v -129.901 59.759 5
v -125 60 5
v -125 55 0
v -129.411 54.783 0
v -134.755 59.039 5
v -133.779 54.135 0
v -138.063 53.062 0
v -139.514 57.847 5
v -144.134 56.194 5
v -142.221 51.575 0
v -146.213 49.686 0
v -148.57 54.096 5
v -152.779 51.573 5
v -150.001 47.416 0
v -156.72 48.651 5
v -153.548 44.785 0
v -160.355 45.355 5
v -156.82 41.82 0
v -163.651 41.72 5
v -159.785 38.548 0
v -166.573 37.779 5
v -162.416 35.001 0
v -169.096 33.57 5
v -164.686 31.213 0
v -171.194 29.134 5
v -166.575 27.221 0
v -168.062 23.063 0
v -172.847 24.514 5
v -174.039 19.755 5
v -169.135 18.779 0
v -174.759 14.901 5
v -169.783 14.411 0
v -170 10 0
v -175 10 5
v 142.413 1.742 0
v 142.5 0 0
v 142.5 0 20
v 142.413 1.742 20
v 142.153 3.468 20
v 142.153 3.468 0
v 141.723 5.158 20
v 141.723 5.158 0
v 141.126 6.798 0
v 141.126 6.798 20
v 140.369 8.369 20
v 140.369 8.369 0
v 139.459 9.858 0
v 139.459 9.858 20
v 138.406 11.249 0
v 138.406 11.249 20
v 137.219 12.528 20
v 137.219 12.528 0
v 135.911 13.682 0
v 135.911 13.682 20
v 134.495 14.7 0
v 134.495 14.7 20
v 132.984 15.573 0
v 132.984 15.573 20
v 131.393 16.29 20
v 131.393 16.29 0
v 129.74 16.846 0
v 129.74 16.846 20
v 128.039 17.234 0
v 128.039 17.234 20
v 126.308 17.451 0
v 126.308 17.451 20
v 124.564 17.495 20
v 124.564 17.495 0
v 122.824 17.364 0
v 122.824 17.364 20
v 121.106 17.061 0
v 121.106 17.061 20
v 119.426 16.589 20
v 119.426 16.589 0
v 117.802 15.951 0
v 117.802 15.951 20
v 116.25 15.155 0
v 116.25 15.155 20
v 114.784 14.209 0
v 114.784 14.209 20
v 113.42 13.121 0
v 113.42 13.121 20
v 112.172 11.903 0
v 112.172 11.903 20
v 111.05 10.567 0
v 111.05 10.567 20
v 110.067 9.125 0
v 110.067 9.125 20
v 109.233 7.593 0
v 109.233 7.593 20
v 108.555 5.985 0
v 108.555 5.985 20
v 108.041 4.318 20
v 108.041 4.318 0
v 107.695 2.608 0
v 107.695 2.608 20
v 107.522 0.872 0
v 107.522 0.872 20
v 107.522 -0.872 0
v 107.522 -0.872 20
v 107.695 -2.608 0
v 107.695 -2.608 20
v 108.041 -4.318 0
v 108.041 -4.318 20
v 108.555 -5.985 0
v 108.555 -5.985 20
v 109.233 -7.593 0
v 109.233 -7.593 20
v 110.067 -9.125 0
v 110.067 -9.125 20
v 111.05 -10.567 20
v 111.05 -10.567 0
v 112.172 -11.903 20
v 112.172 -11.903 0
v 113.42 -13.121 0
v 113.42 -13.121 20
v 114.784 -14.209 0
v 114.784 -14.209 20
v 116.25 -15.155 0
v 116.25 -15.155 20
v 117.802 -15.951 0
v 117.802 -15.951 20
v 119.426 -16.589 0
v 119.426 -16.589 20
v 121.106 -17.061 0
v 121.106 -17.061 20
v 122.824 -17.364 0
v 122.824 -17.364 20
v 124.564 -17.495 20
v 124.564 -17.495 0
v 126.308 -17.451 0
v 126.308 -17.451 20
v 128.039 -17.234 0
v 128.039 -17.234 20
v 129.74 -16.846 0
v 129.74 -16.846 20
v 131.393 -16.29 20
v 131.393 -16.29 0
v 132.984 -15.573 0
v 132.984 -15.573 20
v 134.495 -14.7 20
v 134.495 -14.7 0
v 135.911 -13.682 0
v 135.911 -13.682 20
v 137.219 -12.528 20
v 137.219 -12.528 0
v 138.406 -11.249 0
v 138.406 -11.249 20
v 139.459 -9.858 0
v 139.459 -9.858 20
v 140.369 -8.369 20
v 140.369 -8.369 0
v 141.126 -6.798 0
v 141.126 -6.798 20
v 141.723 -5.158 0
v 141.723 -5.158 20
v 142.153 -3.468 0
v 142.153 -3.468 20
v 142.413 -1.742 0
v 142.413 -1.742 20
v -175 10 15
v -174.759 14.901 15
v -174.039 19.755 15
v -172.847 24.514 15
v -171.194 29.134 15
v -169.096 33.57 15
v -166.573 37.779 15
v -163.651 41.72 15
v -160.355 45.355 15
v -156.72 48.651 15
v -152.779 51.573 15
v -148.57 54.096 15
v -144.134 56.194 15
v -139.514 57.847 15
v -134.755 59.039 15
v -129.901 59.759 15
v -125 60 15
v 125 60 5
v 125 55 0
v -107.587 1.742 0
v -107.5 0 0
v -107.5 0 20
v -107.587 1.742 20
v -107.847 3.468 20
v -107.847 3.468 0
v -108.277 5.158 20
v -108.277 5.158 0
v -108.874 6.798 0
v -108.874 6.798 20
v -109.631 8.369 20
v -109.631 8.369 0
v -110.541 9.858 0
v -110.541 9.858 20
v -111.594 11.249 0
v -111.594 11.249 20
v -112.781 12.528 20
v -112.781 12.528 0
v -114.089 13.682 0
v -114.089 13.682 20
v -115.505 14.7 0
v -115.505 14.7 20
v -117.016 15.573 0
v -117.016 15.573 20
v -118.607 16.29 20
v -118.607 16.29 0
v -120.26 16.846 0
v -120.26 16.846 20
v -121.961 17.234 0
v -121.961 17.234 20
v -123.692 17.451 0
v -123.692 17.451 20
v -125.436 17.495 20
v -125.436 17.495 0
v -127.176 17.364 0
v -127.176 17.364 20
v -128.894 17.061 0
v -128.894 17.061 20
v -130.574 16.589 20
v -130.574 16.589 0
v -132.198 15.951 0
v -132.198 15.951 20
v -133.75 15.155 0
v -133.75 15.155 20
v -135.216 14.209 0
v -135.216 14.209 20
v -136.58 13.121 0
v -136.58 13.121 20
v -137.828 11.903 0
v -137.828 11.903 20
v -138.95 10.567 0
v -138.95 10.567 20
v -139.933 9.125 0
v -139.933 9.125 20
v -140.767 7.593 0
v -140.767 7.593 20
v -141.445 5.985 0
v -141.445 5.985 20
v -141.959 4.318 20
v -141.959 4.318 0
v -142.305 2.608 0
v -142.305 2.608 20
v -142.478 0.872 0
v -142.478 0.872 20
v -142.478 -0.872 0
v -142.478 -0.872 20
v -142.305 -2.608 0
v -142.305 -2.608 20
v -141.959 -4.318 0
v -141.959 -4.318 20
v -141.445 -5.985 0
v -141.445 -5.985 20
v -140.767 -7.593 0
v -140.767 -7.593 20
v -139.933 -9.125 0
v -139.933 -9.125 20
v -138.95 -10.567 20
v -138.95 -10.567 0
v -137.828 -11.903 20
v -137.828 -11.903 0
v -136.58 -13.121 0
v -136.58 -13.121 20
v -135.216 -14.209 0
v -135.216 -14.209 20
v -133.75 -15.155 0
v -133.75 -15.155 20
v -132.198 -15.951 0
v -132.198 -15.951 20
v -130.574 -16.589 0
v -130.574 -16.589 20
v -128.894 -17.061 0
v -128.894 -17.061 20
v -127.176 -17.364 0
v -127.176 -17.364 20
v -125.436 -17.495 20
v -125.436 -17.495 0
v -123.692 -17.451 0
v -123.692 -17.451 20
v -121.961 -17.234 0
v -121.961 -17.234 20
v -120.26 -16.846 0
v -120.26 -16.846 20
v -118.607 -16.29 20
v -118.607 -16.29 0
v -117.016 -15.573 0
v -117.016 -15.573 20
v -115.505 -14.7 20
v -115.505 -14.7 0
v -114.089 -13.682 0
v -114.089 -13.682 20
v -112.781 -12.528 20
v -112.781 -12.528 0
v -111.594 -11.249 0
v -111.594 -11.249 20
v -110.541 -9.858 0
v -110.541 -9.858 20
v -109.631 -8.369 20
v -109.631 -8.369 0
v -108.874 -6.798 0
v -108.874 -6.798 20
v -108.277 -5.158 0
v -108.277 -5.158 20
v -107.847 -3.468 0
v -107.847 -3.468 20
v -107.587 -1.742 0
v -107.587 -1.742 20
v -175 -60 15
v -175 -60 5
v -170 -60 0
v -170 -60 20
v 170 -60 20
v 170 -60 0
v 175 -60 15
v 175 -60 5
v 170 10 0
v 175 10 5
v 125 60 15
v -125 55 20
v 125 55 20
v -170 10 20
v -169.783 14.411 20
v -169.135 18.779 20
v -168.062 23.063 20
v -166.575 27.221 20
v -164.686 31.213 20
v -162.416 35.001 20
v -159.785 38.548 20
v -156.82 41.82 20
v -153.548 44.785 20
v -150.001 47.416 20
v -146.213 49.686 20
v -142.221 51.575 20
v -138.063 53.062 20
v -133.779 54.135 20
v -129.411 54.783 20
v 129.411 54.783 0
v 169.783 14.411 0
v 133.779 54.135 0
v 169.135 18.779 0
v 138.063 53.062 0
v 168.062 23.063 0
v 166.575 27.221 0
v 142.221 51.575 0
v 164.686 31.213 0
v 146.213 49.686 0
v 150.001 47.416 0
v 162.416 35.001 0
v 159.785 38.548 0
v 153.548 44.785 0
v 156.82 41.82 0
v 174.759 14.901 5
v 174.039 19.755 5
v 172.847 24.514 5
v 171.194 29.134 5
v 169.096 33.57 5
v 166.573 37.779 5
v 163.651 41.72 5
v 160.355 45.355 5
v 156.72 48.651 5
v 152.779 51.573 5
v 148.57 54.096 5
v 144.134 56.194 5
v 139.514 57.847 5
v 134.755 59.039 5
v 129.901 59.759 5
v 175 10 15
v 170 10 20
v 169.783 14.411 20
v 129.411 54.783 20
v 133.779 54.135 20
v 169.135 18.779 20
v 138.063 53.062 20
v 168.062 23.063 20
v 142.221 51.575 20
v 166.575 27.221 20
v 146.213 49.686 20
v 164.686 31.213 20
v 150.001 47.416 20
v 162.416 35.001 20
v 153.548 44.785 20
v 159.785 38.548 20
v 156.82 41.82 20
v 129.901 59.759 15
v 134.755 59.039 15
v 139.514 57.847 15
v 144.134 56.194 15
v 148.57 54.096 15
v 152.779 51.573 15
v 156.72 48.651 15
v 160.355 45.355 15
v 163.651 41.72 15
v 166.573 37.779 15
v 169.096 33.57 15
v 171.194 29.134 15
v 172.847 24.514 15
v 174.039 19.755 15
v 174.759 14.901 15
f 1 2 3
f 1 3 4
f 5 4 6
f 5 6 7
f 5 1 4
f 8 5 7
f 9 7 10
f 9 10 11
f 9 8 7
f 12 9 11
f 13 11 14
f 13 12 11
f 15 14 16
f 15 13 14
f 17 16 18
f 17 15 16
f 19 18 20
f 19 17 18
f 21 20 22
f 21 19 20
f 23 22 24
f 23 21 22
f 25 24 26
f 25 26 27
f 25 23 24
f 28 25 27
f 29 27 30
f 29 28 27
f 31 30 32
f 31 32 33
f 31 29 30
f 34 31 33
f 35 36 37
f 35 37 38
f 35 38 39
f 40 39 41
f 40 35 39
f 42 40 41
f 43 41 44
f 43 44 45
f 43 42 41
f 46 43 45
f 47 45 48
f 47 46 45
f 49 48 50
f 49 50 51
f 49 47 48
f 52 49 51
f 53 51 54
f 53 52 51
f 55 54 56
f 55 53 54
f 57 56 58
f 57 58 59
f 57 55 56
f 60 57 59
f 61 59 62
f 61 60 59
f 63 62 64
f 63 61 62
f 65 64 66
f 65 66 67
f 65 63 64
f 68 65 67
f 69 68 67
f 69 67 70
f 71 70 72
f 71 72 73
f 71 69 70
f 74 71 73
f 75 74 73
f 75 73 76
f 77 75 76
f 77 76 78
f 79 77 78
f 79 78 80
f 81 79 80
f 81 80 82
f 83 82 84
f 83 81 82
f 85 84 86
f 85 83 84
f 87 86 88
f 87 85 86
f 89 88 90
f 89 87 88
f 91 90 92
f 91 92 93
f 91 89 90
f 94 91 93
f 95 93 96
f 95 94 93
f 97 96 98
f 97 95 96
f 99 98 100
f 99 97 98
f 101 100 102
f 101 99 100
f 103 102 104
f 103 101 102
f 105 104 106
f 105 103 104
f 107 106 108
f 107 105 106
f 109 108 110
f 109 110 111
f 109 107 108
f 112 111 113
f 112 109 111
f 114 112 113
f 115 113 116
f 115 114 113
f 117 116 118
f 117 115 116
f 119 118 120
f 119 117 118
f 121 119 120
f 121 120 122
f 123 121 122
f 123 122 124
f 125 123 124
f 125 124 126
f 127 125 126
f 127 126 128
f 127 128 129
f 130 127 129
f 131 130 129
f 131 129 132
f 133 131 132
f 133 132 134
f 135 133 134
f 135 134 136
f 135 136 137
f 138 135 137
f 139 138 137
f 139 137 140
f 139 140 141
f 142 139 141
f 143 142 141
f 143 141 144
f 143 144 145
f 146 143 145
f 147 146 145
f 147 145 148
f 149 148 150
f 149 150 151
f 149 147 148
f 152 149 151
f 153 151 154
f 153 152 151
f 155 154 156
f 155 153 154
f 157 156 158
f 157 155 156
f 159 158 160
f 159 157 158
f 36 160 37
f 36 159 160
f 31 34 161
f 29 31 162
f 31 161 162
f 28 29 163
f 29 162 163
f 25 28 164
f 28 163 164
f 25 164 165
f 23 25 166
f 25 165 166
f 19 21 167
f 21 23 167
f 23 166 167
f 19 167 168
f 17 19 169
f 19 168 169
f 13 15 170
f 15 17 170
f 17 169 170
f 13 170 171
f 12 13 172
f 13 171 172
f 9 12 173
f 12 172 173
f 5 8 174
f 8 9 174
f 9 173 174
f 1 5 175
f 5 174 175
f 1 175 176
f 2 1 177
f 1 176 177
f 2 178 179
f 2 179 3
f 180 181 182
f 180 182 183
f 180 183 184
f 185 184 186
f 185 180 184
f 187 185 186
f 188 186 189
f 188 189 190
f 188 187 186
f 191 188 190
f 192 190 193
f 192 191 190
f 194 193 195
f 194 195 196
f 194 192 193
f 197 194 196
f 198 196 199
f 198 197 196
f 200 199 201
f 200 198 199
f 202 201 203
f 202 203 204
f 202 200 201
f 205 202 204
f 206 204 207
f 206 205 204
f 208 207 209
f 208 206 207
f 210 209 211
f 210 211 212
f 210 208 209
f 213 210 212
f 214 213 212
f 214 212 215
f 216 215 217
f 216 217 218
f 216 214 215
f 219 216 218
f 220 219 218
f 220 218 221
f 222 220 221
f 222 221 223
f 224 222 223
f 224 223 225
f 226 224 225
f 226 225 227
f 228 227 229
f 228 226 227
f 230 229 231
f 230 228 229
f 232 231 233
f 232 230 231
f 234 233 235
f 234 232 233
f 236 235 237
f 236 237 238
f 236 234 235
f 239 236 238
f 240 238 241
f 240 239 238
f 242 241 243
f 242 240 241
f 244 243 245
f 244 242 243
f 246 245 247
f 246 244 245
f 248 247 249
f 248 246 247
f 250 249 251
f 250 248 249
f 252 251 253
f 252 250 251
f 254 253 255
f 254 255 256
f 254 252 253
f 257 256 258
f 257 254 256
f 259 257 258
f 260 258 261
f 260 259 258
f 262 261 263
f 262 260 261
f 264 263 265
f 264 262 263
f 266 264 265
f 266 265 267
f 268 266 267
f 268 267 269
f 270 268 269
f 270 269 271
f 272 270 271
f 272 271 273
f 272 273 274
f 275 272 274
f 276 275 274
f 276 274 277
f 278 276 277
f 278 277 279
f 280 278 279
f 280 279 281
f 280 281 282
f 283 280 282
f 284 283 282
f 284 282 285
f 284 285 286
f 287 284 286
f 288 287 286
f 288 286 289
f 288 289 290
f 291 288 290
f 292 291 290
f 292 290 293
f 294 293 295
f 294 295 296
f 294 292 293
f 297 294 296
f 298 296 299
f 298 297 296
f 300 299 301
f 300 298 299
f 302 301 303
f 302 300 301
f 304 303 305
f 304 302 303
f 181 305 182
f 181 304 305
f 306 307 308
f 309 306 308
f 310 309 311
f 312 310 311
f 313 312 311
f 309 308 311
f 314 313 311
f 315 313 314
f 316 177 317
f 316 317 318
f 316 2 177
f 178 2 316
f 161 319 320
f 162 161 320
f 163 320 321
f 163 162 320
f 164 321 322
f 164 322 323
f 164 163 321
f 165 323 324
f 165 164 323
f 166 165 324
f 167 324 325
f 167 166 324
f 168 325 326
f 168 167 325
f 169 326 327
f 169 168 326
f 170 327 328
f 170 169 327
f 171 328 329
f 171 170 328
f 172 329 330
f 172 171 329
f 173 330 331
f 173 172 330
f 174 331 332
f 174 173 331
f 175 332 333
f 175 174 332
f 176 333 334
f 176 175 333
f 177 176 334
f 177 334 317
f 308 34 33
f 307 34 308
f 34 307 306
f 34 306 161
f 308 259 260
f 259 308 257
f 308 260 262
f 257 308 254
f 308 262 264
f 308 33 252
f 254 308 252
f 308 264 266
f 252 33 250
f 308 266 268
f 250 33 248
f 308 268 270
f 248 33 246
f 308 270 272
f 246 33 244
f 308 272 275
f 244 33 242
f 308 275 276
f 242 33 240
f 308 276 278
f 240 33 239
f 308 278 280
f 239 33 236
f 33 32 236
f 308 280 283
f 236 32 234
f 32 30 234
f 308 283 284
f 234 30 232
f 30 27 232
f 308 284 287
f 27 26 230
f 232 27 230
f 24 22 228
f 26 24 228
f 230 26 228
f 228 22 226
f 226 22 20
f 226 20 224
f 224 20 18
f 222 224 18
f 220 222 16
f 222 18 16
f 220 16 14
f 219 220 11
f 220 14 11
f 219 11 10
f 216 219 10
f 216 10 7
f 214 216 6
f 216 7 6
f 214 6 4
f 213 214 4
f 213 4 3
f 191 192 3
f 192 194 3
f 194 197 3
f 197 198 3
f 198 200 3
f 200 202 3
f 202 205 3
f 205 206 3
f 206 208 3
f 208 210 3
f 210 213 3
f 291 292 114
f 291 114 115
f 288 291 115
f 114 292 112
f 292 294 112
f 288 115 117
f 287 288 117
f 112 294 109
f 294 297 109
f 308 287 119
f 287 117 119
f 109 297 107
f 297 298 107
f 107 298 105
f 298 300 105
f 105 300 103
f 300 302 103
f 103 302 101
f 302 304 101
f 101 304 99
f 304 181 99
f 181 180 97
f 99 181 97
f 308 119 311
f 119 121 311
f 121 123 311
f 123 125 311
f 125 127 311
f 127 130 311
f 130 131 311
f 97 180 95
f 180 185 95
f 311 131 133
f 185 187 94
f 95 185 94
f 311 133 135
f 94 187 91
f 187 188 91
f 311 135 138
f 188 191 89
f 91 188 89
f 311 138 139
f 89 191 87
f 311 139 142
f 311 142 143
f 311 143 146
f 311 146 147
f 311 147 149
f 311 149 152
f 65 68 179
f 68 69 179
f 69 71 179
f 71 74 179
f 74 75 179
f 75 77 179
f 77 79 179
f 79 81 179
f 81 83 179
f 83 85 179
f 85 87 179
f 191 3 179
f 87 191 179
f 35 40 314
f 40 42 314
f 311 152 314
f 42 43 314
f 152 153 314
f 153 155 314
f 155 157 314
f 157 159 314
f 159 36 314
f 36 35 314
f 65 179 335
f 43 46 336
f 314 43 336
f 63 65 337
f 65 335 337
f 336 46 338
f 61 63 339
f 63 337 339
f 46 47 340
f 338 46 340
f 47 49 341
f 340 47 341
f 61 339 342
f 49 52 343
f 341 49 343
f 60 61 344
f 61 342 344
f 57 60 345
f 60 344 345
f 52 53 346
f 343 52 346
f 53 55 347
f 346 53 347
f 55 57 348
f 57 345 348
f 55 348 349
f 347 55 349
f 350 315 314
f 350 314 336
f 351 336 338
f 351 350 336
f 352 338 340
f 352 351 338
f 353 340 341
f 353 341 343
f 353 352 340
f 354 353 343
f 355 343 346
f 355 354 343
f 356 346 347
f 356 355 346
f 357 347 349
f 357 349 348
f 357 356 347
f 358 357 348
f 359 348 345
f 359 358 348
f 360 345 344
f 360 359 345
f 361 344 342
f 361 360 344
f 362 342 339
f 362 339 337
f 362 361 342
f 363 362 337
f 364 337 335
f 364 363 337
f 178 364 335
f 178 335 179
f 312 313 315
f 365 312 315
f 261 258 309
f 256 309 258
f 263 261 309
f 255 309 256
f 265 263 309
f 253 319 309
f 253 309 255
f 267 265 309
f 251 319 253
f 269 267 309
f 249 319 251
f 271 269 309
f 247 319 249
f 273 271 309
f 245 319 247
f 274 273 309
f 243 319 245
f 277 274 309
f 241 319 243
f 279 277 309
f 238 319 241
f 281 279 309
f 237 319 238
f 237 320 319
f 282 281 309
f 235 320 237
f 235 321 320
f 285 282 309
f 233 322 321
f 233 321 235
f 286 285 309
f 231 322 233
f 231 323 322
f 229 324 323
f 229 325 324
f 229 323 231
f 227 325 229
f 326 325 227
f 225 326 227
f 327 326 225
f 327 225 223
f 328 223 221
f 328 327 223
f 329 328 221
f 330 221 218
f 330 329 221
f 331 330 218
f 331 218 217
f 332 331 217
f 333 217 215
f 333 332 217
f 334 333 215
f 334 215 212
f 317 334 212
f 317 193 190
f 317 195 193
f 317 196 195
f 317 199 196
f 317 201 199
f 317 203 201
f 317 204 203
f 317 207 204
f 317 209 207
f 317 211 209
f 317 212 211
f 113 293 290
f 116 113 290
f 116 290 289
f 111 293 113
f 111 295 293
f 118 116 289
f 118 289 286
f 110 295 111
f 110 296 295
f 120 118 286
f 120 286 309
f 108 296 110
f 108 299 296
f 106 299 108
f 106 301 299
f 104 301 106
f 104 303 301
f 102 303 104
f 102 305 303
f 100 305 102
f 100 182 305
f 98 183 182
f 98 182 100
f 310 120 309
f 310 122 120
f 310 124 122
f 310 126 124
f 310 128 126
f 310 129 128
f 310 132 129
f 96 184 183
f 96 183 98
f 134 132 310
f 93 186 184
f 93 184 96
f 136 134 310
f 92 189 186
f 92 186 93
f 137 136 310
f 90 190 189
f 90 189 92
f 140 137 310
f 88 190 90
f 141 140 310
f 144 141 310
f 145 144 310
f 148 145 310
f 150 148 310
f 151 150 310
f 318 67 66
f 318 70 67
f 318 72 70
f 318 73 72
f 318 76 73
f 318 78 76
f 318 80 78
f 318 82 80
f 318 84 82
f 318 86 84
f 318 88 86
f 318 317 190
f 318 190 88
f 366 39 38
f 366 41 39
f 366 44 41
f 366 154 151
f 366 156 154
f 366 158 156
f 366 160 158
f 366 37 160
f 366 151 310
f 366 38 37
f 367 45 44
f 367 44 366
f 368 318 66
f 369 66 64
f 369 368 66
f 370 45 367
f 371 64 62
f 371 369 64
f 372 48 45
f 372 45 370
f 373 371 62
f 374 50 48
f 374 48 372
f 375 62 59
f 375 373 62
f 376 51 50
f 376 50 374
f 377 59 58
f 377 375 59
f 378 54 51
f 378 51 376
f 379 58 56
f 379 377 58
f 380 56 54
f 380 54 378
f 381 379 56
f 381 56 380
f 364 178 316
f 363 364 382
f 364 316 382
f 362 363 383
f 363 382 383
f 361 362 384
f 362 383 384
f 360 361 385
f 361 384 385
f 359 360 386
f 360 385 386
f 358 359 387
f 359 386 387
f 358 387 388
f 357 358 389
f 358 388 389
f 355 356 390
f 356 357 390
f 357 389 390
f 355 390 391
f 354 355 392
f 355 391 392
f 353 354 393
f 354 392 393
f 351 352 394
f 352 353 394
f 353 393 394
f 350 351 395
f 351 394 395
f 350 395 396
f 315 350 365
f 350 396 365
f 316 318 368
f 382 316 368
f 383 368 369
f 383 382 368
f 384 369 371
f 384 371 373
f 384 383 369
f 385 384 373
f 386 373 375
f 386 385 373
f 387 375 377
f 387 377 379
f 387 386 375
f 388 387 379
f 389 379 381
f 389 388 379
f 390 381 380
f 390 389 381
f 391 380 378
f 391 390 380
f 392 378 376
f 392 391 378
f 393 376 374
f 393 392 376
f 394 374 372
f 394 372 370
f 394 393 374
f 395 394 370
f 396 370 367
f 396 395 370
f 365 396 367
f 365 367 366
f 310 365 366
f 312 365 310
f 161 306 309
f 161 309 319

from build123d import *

# Parameters (mm, degrees)
F0_W     = 350
F0_H     = 120
F0_R     = 17.5
F1_DEPTH = 20
F2_R     = 50
F3_SIZE  = 5


with BuildPart() as f1:
    # F0 (on Top) → F1 (new body)
    with BuildSketch(Plane.XY):
        Rectangle(F0_W, F0_H)
        with Locations((-125, 0)):
            Circle(F0_R, mode=Mode.SUBTRACT)
        with Locations((125, 0)):
            Circle(F0_R, mode=Mode.SUBTRACT)
    extrude(amount=F1_DEPTH)

    # F2
    f2_edges = [f1.edges().sort_by_distance(p)[0] for p in [
        (175, 60, 10),
        (-175, 60, 10),
    ]]
    fillet(f2_edges, radius=F2_R)

    # F3
    f3_edges = [f1.edges().sort_by_distance(p)[0] for p in [
        (175, -25, 0),
        (0, 60, 20),
    ]]
    chamfer(f3_edges, length=F3_SIZE)


solid = f1.part
